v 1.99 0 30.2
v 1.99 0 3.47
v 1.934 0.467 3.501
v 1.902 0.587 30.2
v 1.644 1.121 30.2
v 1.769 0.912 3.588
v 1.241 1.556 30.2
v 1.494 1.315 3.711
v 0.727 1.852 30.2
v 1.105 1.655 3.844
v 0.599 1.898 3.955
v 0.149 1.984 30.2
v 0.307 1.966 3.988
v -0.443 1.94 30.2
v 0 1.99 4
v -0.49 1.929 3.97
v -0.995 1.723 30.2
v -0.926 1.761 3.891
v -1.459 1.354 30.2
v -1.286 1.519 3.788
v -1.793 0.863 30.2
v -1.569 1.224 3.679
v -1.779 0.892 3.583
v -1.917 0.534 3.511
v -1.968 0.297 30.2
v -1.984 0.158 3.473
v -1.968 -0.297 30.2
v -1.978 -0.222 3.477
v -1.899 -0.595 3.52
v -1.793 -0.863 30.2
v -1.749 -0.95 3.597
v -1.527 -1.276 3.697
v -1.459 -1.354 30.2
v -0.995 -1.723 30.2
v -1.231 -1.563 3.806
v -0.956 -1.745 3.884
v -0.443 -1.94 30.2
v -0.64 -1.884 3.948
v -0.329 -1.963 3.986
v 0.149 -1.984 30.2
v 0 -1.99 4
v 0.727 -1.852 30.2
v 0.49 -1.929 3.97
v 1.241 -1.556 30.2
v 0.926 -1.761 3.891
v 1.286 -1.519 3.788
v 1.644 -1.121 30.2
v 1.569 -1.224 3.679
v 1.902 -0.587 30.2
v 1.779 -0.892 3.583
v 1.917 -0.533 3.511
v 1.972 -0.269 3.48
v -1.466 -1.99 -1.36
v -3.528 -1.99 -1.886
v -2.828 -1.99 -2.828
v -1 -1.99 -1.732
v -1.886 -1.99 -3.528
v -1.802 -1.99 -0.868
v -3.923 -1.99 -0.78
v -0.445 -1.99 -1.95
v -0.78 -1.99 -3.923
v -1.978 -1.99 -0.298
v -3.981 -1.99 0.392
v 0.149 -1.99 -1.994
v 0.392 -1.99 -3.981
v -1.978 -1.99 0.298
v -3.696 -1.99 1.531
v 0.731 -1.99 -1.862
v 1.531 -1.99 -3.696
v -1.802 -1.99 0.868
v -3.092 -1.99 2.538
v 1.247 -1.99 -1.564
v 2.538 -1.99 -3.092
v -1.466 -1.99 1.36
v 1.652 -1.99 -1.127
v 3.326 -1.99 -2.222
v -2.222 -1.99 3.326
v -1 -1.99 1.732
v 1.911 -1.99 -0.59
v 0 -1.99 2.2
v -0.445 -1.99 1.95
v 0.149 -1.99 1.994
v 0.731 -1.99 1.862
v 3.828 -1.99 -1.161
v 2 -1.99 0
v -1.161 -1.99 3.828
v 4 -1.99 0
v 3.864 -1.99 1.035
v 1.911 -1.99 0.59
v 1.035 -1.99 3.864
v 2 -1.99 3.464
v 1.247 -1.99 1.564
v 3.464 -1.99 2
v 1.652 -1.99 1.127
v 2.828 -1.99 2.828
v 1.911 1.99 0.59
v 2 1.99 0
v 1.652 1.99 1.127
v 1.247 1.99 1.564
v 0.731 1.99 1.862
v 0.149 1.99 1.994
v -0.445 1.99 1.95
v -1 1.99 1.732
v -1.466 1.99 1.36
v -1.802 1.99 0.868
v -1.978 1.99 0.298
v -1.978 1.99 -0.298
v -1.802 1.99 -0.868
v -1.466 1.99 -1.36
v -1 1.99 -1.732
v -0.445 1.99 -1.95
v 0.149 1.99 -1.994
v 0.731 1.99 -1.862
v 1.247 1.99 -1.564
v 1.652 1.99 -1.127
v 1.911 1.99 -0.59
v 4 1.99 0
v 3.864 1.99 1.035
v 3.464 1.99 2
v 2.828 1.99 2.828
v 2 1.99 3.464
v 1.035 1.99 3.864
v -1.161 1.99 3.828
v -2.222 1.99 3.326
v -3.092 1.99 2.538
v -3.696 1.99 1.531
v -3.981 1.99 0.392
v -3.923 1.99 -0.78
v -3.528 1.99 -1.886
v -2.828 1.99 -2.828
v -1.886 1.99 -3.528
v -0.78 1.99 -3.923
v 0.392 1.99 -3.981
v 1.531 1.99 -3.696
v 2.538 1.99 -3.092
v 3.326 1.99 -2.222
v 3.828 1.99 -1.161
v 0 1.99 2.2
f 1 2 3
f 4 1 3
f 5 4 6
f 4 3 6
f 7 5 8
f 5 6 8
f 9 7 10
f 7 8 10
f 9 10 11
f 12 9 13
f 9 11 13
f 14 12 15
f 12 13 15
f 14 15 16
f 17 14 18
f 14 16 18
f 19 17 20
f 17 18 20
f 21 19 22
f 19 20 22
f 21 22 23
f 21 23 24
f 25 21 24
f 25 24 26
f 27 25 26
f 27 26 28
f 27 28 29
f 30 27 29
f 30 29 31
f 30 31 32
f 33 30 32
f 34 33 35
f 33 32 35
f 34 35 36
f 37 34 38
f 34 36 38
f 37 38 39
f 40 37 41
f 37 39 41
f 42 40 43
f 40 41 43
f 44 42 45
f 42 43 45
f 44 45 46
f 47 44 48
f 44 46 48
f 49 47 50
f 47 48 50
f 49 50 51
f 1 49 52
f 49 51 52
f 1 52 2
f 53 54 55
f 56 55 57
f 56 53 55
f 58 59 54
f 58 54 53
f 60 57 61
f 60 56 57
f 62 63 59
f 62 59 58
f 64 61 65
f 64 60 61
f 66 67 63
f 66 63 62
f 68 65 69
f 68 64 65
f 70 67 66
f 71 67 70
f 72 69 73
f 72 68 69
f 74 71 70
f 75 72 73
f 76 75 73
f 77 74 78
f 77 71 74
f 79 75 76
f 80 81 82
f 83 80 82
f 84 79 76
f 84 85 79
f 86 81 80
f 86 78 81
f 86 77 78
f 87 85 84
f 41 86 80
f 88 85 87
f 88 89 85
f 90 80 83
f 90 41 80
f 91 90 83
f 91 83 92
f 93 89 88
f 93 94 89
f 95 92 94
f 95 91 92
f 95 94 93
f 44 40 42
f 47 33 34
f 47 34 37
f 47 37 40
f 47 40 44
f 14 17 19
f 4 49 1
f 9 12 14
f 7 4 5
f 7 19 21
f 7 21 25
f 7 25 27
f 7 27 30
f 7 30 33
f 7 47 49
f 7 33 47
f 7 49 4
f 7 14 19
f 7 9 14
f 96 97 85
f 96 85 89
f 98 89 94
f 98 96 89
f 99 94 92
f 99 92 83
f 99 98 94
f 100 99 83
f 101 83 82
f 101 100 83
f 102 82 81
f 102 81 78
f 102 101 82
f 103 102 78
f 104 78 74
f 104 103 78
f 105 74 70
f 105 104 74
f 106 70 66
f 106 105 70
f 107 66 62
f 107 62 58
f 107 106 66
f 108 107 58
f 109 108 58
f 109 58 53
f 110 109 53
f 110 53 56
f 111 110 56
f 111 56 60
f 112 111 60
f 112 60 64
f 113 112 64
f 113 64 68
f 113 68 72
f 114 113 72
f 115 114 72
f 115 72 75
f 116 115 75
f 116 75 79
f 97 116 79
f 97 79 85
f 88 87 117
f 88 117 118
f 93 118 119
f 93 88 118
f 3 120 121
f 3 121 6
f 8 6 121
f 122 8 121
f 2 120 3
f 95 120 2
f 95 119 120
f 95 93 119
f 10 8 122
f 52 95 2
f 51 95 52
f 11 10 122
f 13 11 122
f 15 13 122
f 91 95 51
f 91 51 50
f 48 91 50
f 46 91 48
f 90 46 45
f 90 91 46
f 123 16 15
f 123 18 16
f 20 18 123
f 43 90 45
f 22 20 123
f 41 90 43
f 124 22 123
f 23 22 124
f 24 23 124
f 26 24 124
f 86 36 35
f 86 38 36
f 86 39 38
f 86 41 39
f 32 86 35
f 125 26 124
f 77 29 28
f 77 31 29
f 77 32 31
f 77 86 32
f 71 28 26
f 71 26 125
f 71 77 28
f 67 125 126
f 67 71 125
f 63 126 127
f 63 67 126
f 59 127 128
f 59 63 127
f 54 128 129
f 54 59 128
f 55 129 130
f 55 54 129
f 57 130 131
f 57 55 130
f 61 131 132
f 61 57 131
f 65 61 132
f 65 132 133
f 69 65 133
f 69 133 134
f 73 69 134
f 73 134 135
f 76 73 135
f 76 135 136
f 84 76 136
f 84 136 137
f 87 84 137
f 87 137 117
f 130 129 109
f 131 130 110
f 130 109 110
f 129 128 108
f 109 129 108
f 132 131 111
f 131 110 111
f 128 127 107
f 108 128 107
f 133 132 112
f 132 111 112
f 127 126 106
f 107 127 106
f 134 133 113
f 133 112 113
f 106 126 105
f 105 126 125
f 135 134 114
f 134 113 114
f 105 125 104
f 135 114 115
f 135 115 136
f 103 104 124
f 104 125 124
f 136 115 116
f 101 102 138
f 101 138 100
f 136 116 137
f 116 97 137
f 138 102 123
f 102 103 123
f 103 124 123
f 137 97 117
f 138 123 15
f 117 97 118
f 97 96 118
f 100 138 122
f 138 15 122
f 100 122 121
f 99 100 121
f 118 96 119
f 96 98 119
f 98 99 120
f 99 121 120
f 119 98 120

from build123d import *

# Parameters (mm, degrees)
F0_R     = 4
F0_R_2   = 2
F1_DEPTH = 1.9
F2_DEPTH = 1.99
F4_R     = 1.99
F5_DEPTH = 28


with BuildPart() as f1:
    # F0 (on Front) → F1 (new body, symmetric)
    with BuildSketch(Plane.XZ):
        Circle(F0_R)
        Circle(F0_R_2, mode=Mode.SUBTRACT)
    extrude(amount=F1_DEPTH, both=True)

    # F0 (on Front) → F2 (join, symmetric)
    with BuildSketch(Plane.XZ):
        Circle(F0_R)
        Circle(F0_R_2, mode=Mode.SUBTRACT)
    extrude(amount=F2_DEPTH, both=True)

    # F4 (on offset) → F5 (join)
    with BuildSketch(Plane.XY.offset(2.2)):
        Circle(F4_R)
    extrude(amount=F5_DEPTH)


solid = f1.part
